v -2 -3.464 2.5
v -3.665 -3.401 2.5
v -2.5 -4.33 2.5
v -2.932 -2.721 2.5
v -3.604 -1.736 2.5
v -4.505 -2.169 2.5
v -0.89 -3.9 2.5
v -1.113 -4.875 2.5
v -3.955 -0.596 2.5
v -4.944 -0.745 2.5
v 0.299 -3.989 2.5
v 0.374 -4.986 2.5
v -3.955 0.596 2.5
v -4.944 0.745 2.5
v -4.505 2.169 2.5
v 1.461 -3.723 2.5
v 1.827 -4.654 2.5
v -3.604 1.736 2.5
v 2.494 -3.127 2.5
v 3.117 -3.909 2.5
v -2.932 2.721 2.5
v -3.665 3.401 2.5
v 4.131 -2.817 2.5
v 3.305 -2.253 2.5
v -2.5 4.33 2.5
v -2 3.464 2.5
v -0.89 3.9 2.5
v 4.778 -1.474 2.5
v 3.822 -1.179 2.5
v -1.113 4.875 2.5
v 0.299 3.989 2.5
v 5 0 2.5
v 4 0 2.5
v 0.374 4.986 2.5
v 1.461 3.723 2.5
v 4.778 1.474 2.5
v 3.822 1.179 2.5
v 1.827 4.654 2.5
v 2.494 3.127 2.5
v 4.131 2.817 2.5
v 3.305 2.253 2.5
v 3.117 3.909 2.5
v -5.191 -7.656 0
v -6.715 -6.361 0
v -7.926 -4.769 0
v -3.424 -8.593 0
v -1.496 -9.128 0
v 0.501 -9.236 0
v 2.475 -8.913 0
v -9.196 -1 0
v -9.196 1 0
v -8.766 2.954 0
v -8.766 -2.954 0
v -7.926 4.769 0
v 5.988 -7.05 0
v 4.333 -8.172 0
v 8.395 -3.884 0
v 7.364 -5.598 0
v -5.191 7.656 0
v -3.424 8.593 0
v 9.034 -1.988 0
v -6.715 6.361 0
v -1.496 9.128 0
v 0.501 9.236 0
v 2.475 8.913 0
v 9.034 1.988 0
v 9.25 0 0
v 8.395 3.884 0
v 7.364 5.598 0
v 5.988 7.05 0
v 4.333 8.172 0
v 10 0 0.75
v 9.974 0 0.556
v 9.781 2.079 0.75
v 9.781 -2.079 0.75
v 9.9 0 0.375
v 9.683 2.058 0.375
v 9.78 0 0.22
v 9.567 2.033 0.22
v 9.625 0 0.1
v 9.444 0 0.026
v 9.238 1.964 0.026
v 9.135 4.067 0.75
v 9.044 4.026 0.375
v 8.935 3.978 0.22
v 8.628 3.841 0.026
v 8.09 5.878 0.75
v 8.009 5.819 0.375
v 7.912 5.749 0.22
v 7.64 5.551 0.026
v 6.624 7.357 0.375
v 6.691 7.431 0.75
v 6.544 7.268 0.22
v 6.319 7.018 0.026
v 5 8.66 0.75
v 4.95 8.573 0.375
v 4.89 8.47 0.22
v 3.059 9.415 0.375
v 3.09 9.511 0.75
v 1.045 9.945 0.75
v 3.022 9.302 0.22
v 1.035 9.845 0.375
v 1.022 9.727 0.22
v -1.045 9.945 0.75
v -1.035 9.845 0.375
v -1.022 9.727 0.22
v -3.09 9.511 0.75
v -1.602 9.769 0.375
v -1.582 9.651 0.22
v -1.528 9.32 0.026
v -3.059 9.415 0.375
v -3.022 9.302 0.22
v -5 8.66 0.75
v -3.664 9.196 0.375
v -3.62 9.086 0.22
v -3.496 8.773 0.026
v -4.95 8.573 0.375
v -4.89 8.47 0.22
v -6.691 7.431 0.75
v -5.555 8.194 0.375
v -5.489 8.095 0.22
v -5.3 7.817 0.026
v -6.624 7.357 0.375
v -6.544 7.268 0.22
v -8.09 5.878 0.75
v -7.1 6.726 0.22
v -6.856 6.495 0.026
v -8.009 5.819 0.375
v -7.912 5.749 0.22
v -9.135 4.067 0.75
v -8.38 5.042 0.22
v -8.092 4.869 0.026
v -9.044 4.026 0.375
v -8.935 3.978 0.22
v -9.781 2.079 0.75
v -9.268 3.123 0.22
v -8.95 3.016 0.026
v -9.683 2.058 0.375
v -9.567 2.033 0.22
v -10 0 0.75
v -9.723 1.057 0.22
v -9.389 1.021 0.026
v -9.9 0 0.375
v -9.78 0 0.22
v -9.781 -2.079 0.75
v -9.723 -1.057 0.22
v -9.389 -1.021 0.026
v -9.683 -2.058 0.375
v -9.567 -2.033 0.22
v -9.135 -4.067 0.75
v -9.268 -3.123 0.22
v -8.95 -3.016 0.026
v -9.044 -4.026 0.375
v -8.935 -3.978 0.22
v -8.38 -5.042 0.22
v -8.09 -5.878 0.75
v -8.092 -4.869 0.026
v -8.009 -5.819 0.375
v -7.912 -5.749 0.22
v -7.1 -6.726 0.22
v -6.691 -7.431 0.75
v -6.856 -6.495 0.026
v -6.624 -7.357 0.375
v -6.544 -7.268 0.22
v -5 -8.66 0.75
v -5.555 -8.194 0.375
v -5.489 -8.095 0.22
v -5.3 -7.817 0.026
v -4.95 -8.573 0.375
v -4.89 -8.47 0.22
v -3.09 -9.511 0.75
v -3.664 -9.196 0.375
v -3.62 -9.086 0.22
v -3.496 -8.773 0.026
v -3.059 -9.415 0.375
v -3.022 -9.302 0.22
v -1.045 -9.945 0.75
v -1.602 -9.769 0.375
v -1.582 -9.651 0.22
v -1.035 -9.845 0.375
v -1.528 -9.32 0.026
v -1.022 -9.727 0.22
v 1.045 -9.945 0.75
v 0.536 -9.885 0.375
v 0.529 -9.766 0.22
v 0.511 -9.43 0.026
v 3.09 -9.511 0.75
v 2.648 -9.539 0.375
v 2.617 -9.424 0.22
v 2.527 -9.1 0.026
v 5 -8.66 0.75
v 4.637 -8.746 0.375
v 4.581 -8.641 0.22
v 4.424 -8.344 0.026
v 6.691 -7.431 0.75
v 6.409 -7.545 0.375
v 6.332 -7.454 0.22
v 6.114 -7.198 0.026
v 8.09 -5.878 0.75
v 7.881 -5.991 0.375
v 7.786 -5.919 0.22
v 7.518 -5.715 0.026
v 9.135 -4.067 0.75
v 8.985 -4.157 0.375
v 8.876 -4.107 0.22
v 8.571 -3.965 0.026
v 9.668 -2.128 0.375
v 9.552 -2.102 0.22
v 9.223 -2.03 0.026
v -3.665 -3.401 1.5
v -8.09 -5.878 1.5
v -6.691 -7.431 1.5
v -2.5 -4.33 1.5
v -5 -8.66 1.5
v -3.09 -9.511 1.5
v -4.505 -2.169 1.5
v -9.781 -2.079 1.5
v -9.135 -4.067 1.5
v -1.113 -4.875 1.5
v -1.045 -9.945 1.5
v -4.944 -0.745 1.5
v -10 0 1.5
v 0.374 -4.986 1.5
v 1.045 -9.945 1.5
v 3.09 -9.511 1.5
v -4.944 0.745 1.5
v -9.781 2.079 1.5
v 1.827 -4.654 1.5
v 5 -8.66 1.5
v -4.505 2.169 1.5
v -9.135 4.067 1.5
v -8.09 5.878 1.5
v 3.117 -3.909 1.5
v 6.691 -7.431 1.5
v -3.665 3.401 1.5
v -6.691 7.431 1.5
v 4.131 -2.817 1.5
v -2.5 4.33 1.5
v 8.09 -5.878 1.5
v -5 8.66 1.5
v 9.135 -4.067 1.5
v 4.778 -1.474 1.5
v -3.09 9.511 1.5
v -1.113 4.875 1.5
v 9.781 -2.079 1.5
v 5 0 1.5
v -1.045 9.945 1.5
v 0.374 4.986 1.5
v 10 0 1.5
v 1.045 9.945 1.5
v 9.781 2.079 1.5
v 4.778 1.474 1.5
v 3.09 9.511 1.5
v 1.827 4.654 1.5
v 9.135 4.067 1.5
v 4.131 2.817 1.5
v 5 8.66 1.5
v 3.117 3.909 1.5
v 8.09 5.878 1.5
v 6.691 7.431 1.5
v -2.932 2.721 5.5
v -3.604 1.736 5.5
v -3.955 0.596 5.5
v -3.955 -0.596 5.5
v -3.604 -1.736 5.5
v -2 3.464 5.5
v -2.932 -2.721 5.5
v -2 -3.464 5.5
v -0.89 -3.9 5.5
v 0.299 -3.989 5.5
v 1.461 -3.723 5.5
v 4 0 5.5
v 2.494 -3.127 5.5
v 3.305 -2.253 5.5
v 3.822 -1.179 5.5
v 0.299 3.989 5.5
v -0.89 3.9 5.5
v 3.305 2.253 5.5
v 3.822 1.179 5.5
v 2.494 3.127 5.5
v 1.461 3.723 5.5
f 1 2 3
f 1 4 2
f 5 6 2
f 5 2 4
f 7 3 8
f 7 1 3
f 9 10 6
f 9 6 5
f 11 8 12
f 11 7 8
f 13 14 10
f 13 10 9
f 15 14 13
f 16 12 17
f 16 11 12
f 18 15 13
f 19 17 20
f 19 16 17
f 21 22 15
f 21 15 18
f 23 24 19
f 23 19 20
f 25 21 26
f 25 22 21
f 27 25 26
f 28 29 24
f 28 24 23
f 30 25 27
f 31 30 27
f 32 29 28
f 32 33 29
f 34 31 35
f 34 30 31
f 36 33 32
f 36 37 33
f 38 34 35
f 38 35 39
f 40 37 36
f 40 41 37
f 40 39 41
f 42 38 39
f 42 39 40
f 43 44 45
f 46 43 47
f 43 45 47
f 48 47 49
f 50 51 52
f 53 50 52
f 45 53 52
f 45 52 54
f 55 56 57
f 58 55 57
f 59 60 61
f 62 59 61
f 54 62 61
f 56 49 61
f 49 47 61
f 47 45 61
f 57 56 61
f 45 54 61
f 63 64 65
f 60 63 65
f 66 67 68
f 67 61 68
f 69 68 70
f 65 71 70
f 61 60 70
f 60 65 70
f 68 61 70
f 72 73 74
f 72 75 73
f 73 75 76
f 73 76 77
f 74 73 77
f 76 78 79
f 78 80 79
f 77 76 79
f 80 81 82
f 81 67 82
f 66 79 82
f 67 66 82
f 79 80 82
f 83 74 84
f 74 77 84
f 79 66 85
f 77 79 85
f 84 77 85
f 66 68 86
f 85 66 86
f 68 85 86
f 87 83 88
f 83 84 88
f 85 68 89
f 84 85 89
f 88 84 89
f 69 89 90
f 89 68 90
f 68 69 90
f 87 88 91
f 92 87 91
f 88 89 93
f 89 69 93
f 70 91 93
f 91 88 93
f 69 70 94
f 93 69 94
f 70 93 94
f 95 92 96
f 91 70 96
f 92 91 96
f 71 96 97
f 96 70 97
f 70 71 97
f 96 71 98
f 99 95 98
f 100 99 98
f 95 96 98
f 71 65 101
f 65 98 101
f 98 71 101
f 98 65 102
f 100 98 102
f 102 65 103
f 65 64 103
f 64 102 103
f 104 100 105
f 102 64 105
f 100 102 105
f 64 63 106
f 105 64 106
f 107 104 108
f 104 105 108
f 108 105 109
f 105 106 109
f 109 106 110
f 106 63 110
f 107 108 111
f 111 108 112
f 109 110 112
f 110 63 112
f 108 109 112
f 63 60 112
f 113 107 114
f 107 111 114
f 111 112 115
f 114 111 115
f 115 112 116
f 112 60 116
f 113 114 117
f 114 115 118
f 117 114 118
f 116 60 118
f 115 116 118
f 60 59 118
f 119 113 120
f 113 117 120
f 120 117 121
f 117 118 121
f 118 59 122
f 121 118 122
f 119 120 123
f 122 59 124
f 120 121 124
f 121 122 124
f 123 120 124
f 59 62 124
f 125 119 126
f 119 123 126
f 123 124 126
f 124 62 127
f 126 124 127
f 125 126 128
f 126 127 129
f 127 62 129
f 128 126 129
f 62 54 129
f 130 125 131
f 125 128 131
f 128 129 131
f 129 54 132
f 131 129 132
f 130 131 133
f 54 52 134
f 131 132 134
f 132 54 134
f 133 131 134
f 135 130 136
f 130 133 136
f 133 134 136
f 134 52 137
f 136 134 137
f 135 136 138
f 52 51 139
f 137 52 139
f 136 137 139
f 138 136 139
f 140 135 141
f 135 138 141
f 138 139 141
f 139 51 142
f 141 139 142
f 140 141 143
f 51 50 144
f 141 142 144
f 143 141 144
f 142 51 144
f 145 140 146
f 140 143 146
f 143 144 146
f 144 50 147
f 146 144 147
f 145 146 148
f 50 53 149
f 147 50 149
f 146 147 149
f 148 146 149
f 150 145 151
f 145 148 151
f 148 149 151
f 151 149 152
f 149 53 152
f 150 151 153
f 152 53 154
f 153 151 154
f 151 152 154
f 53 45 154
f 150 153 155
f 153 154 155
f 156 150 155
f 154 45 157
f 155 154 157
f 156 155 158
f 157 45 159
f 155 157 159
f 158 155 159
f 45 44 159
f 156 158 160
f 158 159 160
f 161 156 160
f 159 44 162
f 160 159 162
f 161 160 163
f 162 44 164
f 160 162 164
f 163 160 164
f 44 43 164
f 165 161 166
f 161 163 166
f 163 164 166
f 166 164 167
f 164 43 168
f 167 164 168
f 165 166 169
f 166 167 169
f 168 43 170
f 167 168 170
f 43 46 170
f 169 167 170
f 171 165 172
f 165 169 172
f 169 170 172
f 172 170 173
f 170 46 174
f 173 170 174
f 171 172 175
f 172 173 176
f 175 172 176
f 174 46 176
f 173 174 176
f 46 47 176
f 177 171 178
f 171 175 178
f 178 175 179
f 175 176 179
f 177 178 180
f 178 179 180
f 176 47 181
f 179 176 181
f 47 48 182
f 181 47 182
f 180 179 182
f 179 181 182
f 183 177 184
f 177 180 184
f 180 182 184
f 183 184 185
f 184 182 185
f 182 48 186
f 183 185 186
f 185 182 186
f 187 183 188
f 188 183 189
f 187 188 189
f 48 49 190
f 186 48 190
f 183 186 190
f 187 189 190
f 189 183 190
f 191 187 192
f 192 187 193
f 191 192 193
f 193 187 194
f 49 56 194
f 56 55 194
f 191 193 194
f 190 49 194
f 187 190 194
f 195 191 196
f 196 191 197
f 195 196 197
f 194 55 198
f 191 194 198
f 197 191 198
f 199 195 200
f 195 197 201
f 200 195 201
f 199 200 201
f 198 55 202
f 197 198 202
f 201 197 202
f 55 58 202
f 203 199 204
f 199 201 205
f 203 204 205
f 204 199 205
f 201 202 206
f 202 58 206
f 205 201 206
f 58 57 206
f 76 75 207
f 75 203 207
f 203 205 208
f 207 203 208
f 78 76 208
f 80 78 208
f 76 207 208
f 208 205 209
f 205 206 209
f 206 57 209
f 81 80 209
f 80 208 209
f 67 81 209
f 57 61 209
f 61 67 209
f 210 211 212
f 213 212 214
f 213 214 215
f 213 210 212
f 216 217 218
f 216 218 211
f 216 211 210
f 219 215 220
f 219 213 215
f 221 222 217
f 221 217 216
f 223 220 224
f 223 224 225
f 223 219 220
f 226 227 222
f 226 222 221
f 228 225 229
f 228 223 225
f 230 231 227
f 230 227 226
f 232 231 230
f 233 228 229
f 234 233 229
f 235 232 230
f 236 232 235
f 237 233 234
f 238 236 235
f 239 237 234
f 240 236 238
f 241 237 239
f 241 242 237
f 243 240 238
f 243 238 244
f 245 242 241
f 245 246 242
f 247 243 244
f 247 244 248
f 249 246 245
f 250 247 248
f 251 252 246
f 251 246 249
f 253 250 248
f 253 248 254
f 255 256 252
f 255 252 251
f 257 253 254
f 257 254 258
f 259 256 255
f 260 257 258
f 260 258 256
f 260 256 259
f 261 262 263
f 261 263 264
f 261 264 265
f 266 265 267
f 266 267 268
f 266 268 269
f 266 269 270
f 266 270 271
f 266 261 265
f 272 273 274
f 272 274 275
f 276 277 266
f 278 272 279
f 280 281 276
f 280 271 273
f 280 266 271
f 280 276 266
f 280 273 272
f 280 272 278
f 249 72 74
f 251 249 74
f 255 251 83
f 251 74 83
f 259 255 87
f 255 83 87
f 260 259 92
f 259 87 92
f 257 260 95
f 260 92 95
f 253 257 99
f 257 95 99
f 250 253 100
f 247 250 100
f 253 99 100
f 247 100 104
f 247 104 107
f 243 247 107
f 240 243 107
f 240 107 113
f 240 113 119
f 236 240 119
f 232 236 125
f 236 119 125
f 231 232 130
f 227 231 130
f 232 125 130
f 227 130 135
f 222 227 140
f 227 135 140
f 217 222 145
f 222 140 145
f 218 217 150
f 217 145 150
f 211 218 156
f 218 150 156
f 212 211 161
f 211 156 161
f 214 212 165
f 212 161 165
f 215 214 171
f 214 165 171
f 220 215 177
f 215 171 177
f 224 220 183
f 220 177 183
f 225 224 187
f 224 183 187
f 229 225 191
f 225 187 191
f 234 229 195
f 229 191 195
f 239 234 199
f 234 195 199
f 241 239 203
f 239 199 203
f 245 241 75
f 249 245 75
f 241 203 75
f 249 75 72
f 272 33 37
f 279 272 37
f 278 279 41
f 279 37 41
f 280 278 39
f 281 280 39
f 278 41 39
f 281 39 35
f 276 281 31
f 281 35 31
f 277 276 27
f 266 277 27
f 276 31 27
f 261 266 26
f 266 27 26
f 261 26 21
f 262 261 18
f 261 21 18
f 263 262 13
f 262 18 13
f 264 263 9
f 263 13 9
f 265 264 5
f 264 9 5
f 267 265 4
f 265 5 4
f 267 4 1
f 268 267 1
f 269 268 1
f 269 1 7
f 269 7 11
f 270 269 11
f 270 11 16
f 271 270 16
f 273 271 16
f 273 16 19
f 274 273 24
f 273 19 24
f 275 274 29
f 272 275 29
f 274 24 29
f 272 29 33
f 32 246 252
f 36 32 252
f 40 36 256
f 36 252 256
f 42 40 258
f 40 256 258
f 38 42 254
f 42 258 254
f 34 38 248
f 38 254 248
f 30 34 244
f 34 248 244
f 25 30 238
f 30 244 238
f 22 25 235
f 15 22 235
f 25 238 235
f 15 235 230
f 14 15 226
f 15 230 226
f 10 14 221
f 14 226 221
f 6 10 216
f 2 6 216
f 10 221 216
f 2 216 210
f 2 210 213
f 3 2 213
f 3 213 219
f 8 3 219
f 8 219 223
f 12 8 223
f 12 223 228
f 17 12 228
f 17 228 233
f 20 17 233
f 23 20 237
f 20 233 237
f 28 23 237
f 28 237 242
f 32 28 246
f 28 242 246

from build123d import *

# Parameters (mm, degrees)
F0_R     = 10
F1_DEPTH = 1.5
F2_R     = 5
F3_DEPTH = 1
F4_R     = 4
F5_DEPTH = 3
F6_R     = 0.75


with BuildPart() as f1:
    # F0 (on Top) → F1 (new body)
    with BuildSketch(Plane.XY):
        Circle(F0_R)
    extrude(amount=F1_DEPTH)

    # F2 (on face) → F3 (join)
    with BuildSketch(Plane.XY.offset(1.5)):
        Circle(F2_R)
    extrude(amount=F3_DEPTH)

    # F4 (on face) → F5 (join)
    with BuildSketch(Plane.XY.offset(2.5)):
        Circle(F4_R)
    extrude(amount=F5_DEPTH)

    # F6
    f6_edges = [f1.edges().sort_by_distance(p)[0] for p in [
        (-10, 0, 0),
    ]]
    fillet(f6_edges, radius=F6_R)


solid = f1.part
